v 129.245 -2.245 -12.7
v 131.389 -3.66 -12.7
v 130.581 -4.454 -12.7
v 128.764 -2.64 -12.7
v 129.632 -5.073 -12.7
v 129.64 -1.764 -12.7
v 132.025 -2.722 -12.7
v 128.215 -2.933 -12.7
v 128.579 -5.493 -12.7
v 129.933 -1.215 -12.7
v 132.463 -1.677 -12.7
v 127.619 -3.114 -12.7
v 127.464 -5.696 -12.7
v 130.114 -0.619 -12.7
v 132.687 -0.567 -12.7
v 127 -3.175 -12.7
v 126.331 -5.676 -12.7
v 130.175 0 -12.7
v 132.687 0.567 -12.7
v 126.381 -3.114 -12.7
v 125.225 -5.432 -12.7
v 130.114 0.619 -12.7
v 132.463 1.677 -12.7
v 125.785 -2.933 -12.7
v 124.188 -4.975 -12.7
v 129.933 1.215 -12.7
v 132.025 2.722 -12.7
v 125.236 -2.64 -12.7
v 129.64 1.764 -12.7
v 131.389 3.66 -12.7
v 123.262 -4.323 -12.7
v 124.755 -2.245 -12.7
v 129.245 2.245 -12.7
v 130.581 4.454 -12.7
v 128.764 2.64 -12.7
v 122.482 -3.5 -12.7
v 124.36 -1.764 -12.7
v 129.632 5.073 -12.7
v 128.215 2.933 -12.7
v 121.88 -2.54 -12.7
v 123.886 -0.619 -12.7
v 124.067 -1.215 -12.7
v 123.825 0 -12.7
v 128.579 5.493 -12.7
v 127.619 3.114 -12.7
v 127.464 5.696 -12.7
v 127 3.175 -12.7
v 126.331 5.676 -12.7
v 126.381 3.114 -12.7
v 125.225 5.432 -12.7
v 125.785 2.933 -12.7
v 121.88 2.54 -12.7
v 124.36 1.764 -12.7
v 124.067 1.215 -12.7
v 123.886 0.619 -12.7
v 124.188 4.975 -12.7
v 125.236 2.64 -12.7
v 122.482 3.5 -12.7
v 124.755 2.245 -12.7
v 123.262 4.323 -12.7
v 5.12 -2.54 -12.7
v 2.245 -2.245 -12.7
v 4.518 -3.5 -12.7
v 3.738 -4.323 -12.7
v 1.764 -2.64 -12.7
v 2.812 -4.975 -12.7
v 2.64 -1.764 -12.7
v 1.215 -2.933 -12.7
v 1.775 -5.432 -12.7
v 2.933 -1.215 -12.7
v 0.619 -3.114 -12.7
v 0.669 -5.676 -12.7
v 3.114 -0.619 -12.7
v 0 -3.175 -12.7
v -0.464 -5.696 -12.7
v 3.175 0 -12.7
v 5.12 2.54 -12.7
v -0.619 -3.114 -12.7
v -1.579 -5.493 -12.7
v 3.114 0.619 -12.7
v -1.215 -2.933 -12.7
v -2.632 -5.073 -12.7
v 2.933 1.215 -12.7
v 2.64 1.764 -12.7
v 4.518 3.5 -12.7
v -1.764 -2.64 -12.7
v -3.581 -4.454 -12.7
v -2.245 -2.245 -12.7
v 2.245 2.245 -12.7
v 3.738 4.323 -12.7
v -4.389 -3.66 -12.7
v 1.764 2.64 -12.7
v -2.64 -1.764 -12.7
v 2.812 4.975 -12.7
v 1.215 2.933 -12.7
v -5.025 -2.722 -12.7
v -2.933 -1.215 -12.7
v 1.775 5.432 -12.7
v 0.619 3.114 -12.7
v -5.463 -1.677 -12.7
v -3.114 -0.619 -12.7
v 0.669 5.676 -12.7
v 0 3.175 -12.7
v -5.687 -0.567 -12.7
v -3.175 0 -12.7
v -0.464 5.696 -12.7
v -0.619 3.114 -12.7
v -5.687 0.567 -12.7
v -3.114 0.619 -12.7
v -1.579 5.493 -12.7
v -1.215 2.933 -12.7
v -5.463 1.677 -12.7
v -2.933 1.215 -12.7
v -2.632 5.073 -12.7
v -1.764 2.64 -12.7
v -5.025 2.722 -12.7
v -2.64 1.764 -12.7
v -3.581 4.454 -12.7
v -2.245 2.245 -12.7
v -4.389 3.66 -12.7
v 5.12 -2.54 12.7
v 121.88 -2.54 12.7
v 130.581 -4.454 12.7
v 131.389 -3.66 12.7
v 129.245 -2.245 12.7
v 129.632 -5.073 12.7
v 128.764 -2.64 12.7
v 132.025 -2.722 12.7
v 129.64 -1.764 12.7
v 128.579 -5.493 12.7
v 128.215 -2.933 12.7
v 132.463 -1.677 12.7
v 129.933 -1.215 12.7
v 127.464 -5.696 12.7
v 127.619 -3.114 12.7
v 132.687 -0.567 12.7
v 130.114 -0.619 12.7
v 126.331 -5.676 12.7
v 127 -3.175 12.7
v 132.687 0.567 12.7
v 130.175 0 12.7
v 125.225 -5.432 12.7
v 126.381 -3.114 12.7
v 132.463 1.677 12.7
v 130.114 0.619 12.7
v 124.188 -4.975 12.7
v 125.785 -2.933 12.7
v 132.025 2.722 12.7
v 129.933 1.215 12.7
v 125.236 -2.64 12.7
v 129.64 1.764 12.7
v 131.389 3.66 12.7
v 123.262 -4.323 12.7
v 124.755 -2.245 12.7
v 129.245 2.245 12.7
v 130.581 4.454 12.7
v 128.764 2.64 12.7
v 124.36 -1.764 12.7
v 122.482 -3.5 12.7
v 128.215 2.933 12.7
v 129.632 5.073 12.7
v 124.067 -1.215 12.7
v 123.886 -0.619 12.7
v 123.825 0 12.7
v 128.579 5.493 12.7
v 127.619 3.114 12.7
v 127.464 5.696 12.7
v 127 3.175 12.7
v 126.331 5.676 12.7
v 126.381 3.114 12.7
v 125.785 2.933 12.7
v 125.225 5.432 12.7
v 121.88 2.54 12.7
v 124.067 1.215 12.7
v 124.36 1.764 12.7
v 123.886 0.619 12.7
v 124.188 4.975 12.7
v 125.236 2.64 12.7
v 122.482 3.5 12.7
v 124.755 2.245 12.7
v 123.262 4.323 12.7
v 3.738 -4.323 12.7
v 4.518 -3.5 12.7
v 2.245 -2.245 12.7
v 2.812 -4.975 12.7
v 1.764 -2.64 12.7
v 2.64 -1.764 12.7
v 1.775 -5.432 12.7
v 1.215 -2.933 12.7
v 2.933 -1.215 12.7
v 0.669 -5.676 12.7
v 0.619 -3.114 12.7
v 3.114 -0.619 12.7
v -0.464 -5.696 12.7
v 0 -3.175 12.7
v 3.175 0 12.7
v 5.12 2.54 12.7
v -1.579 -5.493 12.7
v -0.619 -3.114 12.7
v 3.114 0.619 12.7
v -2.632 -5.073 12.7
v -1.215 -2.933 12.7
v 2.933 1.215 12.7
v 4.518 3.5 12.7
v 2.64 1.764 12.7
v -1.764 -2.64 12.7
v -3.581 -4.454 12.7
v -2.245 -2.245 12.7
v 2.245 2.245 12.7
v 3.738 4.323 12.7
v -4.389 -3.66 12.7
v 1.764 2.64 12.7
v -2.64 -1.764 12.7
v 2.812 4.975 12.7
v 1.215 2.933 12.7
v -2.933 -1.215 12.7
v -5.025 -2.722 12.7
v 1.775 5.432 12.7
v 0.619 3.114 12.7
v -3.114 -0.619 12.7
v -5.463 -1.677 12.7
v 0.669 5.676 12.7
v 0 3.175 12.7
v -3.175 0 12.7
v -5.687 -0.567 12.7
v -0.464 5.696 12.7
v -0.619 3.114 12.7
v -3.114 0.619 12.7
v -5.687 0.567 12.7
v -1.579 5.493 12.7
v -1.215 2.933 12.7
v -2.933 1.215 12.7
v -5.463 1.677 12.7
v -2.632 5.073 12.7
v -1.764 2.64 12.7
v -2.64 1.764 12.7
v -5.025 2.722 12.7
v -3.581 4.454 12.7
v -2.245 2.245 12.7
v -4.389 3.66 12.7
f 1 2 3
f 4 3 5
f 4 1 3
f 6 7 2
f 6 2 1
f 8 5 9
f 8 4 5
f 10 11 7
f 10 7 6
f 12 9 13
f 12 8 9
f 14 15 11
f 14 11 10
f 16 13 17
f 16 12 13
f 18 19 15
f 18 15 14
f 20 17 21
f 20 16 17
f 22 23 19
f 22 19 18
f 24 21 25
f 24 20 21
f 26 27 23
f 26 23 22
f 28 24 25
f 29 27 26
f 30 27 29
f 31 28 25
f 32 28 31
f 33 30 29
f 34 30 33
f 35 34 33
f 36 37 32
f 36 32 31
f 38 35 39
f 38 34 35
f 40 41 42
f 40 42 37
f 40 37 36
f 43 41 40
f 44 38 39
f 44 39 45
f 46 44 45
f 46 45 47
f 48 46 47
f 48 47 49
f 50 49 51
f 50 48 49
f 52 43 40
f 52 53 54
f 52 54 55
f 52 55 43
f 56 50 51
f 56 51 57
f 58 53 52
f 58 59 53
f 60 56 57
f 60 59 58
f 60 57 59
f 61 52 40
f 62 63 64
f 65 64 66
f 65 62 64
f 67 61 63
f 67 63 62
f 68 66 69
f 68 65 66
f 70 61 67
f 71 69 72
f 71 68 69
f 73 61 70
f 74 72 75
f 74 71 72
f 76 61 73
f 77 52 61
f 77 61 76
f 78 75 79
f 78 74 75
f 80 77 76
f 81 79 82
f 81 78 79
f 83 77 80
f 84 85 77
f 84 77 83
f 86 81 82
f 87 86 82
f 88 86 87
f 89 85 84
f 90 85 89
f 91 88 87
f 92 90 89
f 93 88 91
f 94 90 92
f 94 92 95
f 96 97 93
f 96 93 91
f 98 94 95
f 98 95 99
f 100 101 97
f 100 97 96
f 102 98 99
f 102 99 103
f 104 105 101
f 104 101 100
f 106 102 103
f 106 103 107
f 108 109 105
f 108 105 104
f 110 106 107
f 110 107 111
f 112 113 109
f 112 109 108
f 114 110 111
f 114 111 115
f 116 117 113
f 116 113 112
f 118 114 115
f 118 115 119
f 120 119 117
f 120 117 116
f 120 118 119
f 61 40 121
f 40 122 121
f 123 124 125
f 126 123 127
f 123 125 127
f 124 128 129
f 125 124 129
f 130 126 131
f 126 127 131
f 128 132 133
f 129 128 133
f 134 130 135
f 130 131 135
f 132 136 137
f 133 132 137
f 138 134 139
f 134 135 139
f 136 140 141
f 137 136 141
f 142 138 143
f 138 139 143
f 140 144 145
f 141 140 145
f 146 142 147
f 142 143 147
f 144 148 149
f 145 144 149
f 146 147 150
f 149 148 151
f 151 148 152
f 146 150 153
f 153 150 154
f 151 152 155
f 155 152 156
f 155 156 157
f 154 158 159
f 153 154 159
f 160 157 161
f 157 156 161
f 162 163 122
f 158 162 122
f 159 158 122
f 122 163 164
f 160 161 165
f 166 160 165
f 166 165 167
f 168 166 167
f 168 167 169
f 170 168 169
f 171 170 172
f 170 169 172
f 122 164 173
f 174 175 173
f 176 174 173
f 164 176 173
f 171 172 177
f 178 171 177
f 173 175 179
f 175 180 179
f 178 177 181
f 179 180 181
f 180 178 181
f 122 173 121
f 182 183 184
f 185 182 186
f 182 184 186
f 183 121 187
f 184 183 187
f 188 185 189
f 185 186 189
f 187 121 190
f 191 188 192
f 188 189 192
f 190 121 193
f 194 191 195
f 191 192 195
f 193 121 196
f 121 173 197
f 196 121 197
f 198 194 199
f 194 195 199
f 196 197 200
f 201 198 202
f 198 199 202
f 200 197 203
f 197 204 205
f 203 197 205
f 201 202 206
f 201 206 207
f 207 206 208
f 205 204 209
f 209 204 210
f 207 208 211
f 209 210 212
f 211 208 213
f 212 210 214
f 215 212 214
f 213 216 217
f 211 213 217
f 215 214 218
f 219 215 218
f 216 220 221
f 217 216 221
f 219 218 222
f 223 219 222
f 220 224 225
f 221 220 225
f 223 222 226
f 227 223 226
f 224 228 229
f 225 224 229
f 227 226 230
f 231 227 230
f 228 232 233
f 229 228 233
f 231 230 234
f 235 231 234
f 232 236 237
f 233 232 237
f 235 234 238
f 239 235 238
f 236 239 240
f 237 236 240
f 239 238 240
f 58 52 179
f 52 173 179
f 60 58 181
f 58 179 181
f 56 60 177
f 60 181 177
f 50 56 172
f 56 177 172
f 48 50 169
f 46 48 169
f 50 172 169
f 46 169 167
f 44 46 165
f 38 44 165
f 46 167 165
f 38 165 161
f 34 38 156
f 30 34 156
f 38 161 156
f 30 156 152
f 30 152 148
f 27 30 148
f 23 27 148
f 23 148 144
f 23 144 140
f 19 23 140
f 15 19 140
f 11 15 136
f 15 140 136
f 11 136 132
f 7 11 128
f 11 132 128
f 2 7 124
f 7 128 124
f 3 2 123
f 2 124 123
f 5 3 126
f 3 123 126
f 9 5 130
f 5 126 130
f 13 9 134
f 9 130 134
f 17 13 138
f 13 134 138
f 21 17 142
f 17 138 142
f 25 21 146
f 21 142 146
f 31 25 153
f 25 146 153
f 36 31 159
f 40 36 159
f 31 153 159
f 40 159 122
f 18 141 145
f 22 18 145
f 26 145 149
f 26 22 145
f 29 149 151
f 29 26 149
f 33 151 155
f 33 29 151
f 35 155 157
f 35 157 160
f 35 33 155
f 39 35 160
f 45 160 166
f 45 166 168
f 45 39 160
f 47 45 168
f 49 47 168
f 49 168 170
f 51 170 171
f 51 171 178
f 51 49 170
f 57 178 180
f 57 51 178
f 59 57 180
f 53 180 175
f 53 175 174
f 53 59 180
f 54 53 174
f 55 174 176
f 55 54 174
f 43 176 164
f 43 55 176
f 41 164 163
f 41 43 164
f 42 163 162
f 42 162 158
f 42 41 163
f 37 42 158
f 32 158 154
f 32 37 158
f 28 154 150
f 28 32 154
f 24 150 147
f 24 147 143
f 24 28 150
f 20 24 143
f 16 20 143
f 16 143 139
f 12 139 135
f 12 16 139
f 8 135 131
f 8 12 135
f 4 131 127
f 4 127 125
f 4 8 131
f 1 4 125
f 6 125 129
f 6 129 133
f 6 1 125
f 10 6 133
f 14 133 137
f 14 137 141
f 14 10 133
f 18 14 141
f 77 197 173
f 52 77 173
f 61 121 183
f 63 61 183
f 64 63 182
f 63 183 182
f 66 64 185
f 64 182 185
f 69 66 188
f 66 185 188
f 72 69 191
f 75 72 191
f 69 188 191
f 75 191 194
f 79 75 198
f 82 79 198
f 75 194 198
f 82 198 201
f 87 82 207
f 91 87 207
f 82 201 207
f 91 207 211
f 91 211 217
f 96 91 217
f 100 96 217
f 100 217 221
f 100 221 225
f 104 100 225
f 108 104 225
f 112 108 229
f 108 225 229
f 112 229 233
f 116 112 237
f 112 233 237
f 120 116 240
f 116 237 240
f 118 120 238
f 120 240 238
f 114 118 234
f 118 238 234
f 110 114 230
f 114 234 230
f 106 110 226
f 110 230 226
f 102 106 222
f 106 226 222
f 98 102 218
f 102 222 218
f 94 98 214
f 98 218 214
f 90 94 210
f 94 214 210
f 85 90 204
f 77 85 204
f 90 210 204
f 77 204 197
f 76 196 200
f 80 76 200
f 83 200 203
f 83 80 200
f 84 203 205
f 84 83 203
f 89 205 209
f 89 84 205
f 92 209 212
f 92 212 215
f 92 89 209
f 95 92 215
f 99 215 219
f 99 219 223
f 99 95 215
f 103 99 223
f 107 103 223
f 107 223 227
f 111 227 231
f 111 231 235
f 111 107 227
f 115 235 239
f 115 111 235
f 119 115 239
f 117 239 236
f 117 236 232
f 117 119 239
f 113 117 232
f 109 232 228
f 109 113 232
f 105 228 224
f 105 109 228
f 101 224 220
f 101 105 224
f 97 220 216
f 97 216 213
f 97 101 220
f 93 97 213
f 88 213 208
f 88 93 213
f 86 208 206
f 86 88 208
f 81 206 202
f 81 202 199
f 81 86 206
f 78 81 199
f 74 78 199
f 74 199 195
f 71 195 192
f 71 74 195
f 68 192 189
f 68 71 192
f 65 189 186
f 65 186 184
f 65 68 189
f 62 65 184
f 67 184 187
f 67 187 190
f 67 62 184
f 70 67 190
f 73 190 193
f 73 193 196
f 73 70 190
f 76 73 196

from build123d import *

# Parameters (mm, degrees)
SKETCH1_R           = 3.175
BOSS_EXTRUDE1_DEPTH = 12.7


with BuildPart() as part:
    # Sketch1 → Boss-Extrude1 (new body, symmetric)
    with BuildSketch(Plane.XY):
        with BuildLine():
            Line((5.11953367, 2.54), (121.88046633, 2.54))
            ThreePointArc((121.88046633, 2.54), (132.715, 0), (121.88046633, -2.54))
            Line((121.88046633, -2.54), (5.11953367, -2.54))
            ThreePointArc((5.11953367, -2.54), (-5.715, 0), (5.11953367, 2.54))
        make_face()
        Circle(SKETCH1_R, mode=Mode.SUBTRACT)
        with Locations((127, 0)):
            Circle(SKETCH1_R, mode=Mode.SUBTRACT)
    extrude(amount=BOSS_EXTRUDE1_DEPTH, both=True)


solid = part.part
